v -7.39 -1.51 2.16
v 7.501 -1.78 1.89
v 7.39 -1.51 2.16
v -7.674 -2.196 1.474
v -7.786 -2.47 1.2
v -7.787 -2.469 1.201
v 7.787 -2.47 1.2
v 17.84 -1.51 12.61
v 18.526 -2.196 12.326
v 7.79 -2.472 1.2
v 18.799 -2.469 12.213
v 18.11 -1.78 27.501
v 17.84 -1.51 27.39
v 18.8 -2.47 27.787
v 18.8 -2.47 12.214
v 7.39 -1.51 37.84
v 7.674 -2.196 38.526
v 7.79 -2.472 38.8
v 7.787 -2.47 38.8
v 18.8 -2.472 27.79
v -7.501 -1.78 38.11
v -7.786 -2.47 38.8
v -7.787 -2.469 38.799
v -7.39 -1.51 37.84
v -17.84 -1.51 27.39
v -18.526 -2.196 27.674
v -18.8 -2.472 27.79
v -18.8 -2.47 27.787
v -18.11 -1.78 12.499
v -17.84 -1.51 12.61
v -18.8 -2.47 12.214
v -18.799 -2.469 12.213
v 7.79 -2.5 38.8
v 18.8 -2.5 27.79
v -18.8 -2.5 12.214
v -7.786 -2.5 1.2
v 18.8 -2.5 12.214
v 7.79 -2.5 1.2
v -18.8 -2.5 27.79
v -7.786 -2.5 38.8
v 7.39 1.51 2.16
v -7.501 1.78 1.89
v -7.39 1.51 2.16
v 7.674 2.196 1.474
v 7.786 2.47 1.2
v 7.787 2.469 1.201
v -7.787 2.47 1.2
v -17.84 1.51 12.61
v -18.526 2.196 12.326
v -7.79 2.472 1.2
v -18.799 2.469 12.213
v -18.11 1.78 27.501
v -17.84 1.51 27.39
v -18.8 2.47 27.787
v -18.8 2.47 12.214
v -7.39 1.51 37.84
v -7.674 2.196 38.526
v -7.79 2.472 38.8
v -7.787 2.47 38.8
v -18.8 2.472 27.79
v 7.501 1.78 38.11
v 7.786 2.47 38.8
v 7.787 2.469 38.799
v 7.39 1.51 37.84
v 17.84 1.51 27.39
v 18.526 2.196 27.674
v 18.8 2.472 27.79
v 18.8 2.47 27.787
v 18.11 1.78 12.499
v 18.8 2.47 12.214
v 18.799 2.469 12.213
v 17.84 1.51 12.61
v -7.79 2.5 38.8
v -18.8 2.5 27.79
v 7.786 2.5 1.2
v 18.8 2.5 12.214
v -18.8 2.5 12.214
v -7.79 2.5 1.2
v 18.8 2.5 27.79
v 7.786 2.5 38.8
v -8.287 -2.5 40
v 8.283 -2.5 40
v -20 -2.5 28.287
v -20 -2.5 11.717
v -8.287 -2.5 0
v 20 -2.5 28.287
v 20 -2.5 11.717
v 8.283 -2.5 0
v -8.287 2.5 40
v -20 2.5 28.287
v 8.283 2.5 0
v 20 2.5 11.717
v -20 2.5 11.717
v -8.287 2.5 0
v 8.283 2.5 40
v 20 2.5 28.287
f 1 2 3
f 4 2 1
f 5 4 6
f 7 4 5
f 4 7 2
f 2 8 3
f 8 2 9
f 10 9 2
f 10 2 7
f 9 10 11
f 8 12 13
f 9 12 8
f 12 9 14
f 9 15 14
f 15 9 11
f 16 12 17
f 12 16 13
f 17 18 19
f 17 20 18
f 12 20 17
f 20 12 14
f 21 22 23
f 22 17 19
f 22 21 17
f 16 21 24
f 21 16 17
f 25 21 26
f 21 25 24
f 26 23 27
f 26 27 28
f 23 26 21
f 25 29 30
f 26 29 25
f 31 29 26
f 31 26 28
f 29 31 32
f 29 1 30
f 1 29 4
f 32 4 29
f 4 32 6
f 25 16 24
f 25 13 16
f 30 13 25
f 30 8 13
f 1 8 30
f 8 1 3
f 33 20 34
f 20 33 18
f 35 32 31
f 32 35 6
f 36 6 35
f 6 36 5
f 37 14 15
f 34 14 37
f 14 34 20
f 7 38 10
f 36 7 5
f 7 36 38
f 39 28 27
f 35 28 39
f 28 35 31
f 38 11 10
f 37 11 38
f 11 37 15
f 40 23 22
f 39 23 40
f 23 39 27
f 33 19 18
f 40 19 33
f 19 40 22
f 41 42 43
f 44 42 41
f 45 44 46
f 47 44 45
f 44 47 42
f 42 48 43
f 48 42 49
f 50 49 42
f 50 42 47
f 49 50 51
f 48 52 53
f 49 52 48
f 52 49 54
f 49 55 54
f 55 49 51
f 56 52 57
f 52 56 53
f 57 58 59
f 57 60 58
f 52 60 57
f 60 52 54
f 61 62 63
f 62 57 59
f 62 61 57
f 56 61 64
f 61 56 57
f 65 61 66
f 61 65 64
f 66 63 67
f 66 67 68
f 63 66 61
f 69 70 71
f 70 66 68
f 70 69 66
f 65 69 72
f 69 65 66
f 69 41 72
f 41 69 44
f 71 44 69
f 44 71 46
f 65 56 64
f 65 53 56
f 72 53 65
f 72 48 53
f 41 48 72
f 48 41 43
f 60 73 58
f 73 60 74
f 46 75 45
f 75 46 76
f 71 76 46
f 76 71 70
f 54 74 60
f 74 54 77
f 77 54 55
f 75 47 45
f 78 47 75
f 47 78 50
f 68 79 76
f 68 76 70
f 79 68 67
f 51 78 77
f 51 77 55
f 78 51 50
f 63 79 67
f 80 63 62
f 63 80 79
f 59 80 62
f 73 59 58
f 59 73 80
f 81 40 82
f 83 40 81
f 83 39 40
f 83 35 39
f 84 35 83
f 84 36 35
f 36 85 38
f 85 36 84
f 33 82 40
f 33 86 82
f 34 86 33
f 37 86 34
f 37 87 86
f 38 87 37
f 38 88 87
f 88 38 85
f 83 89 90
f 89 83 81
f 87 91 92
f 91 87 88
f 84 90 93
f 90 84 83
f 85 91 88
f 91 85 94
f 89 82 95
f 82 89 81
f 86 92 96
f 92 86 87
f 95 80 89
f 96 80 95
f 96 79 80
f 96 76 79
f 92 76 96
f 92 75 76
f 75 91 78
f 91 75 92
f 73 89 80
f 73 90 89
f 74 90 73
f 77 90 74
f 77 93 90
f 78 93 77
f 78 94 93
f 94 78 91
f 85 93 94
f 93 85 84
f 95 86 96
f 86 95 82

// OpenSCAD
$fn = 20;

front_file = "front.dxf";
back_file = "back.dxf";

coin_d = 40.0;
coin_total_thickness = 5.0;
coin_raised_thickness = 1.0;
coin_rim_w = 1.2;

fudge = 0.01;

octagon_d_to_side_ratio = 2.414;

translate([0, coin_total_thickness / 2.0, coin_d / 2.0])
	rotate([90, 0, 0])
		coin();

module coin() {
	union() {
		difference() {
			translate([0, 0, coin_total_thickness]) {
				rotate([0, 180, 0]) {
					union() {
						difference() {
							octagon(coin_d, coin_total_thickness);

							translate([0, 0, coin_total_thickness - coin_raised_thickness + fudge])
								inset_cutter();
						}

						translate([0, 0, coin_total_thickness - coin_raised_thickness])
							printable_extrude(back_file, coin_raised_thickness);
					}
				}
			}

			translate([0, 0, coin_total_thickness - coin_raised_thickness + fudge])
				inset_cutter();
		}

		translate([0, 0, coin_total_thickness - coin_raised_thickness])
			printable_extrude(front_file, coin_raised_thickness);
	}
}

module printable_extrude(dxf_path, thickness) {
	translate([0, 0, -(thickness + fudge) - fudge]) {
		difference() {
			minkowski() {
				translate([-coin_d / 2.0, -coin_d / 2.0, 0])
					linear_extrude(height=thickness + fudge)
						import(dxf_path);
	
				cylinder(thickness + fudge, thickness, 0);
			}

			translate([-coin_d / 2.0, -coin_d / 2.0, -fudge])
				cube([coin_d, coin_d, thickness + (2 * fudge)]);
		}
	}
}

module inset_cutter() {
	cutter_d = (coin_d - (2 * coin_rim_w));

	difference() {
		octagon(cutter_d, coin_raised_thickness + fudge);

		for(angle=[0:360/8.0:360]) {
			rotate([0, 0, angle]) {
				translate([-cutter_d / 2.0, -cutter_d / 2.0, 0]) {
					rotate([0, 90, 0]) {
						translate([-coin_raised_thickness + (2 * fudge), 
								-(2 * fudge), -(2 * fudge)]) {
							linear_extrude(height=cutter_d)
								polygon([
										[-fudge, -fudge],
										[coin_raised_thickness + (2 * fudge), 
												coin_raised_thickness + (2 * fudge)],
										[coin_raised_thickness + (2 * fudge), -fudge],
									]);
						}
					}
				}
			}
		}
	}
}

module octagon(diameter, thickness) {
	side_length = diameter / octagon_d_to_side_ratio;
	corner_length = side_length / sqrt(2);

	translate([-diameter / 2.0, -diameter / 2.0, 0]) {
		linear_extrude(height=thickness)
			polygon([
					[corner_length, 0],
					[corner_length + side_length, 0],
					[diameter, corner_length],
					[diameter, corner_length + side_length],
					[corner_length + side_length, diameter],
					[corner_length, diameter],
					[0, corner_length + side_length],
					[0, corner_length],
				]);
	}
}
